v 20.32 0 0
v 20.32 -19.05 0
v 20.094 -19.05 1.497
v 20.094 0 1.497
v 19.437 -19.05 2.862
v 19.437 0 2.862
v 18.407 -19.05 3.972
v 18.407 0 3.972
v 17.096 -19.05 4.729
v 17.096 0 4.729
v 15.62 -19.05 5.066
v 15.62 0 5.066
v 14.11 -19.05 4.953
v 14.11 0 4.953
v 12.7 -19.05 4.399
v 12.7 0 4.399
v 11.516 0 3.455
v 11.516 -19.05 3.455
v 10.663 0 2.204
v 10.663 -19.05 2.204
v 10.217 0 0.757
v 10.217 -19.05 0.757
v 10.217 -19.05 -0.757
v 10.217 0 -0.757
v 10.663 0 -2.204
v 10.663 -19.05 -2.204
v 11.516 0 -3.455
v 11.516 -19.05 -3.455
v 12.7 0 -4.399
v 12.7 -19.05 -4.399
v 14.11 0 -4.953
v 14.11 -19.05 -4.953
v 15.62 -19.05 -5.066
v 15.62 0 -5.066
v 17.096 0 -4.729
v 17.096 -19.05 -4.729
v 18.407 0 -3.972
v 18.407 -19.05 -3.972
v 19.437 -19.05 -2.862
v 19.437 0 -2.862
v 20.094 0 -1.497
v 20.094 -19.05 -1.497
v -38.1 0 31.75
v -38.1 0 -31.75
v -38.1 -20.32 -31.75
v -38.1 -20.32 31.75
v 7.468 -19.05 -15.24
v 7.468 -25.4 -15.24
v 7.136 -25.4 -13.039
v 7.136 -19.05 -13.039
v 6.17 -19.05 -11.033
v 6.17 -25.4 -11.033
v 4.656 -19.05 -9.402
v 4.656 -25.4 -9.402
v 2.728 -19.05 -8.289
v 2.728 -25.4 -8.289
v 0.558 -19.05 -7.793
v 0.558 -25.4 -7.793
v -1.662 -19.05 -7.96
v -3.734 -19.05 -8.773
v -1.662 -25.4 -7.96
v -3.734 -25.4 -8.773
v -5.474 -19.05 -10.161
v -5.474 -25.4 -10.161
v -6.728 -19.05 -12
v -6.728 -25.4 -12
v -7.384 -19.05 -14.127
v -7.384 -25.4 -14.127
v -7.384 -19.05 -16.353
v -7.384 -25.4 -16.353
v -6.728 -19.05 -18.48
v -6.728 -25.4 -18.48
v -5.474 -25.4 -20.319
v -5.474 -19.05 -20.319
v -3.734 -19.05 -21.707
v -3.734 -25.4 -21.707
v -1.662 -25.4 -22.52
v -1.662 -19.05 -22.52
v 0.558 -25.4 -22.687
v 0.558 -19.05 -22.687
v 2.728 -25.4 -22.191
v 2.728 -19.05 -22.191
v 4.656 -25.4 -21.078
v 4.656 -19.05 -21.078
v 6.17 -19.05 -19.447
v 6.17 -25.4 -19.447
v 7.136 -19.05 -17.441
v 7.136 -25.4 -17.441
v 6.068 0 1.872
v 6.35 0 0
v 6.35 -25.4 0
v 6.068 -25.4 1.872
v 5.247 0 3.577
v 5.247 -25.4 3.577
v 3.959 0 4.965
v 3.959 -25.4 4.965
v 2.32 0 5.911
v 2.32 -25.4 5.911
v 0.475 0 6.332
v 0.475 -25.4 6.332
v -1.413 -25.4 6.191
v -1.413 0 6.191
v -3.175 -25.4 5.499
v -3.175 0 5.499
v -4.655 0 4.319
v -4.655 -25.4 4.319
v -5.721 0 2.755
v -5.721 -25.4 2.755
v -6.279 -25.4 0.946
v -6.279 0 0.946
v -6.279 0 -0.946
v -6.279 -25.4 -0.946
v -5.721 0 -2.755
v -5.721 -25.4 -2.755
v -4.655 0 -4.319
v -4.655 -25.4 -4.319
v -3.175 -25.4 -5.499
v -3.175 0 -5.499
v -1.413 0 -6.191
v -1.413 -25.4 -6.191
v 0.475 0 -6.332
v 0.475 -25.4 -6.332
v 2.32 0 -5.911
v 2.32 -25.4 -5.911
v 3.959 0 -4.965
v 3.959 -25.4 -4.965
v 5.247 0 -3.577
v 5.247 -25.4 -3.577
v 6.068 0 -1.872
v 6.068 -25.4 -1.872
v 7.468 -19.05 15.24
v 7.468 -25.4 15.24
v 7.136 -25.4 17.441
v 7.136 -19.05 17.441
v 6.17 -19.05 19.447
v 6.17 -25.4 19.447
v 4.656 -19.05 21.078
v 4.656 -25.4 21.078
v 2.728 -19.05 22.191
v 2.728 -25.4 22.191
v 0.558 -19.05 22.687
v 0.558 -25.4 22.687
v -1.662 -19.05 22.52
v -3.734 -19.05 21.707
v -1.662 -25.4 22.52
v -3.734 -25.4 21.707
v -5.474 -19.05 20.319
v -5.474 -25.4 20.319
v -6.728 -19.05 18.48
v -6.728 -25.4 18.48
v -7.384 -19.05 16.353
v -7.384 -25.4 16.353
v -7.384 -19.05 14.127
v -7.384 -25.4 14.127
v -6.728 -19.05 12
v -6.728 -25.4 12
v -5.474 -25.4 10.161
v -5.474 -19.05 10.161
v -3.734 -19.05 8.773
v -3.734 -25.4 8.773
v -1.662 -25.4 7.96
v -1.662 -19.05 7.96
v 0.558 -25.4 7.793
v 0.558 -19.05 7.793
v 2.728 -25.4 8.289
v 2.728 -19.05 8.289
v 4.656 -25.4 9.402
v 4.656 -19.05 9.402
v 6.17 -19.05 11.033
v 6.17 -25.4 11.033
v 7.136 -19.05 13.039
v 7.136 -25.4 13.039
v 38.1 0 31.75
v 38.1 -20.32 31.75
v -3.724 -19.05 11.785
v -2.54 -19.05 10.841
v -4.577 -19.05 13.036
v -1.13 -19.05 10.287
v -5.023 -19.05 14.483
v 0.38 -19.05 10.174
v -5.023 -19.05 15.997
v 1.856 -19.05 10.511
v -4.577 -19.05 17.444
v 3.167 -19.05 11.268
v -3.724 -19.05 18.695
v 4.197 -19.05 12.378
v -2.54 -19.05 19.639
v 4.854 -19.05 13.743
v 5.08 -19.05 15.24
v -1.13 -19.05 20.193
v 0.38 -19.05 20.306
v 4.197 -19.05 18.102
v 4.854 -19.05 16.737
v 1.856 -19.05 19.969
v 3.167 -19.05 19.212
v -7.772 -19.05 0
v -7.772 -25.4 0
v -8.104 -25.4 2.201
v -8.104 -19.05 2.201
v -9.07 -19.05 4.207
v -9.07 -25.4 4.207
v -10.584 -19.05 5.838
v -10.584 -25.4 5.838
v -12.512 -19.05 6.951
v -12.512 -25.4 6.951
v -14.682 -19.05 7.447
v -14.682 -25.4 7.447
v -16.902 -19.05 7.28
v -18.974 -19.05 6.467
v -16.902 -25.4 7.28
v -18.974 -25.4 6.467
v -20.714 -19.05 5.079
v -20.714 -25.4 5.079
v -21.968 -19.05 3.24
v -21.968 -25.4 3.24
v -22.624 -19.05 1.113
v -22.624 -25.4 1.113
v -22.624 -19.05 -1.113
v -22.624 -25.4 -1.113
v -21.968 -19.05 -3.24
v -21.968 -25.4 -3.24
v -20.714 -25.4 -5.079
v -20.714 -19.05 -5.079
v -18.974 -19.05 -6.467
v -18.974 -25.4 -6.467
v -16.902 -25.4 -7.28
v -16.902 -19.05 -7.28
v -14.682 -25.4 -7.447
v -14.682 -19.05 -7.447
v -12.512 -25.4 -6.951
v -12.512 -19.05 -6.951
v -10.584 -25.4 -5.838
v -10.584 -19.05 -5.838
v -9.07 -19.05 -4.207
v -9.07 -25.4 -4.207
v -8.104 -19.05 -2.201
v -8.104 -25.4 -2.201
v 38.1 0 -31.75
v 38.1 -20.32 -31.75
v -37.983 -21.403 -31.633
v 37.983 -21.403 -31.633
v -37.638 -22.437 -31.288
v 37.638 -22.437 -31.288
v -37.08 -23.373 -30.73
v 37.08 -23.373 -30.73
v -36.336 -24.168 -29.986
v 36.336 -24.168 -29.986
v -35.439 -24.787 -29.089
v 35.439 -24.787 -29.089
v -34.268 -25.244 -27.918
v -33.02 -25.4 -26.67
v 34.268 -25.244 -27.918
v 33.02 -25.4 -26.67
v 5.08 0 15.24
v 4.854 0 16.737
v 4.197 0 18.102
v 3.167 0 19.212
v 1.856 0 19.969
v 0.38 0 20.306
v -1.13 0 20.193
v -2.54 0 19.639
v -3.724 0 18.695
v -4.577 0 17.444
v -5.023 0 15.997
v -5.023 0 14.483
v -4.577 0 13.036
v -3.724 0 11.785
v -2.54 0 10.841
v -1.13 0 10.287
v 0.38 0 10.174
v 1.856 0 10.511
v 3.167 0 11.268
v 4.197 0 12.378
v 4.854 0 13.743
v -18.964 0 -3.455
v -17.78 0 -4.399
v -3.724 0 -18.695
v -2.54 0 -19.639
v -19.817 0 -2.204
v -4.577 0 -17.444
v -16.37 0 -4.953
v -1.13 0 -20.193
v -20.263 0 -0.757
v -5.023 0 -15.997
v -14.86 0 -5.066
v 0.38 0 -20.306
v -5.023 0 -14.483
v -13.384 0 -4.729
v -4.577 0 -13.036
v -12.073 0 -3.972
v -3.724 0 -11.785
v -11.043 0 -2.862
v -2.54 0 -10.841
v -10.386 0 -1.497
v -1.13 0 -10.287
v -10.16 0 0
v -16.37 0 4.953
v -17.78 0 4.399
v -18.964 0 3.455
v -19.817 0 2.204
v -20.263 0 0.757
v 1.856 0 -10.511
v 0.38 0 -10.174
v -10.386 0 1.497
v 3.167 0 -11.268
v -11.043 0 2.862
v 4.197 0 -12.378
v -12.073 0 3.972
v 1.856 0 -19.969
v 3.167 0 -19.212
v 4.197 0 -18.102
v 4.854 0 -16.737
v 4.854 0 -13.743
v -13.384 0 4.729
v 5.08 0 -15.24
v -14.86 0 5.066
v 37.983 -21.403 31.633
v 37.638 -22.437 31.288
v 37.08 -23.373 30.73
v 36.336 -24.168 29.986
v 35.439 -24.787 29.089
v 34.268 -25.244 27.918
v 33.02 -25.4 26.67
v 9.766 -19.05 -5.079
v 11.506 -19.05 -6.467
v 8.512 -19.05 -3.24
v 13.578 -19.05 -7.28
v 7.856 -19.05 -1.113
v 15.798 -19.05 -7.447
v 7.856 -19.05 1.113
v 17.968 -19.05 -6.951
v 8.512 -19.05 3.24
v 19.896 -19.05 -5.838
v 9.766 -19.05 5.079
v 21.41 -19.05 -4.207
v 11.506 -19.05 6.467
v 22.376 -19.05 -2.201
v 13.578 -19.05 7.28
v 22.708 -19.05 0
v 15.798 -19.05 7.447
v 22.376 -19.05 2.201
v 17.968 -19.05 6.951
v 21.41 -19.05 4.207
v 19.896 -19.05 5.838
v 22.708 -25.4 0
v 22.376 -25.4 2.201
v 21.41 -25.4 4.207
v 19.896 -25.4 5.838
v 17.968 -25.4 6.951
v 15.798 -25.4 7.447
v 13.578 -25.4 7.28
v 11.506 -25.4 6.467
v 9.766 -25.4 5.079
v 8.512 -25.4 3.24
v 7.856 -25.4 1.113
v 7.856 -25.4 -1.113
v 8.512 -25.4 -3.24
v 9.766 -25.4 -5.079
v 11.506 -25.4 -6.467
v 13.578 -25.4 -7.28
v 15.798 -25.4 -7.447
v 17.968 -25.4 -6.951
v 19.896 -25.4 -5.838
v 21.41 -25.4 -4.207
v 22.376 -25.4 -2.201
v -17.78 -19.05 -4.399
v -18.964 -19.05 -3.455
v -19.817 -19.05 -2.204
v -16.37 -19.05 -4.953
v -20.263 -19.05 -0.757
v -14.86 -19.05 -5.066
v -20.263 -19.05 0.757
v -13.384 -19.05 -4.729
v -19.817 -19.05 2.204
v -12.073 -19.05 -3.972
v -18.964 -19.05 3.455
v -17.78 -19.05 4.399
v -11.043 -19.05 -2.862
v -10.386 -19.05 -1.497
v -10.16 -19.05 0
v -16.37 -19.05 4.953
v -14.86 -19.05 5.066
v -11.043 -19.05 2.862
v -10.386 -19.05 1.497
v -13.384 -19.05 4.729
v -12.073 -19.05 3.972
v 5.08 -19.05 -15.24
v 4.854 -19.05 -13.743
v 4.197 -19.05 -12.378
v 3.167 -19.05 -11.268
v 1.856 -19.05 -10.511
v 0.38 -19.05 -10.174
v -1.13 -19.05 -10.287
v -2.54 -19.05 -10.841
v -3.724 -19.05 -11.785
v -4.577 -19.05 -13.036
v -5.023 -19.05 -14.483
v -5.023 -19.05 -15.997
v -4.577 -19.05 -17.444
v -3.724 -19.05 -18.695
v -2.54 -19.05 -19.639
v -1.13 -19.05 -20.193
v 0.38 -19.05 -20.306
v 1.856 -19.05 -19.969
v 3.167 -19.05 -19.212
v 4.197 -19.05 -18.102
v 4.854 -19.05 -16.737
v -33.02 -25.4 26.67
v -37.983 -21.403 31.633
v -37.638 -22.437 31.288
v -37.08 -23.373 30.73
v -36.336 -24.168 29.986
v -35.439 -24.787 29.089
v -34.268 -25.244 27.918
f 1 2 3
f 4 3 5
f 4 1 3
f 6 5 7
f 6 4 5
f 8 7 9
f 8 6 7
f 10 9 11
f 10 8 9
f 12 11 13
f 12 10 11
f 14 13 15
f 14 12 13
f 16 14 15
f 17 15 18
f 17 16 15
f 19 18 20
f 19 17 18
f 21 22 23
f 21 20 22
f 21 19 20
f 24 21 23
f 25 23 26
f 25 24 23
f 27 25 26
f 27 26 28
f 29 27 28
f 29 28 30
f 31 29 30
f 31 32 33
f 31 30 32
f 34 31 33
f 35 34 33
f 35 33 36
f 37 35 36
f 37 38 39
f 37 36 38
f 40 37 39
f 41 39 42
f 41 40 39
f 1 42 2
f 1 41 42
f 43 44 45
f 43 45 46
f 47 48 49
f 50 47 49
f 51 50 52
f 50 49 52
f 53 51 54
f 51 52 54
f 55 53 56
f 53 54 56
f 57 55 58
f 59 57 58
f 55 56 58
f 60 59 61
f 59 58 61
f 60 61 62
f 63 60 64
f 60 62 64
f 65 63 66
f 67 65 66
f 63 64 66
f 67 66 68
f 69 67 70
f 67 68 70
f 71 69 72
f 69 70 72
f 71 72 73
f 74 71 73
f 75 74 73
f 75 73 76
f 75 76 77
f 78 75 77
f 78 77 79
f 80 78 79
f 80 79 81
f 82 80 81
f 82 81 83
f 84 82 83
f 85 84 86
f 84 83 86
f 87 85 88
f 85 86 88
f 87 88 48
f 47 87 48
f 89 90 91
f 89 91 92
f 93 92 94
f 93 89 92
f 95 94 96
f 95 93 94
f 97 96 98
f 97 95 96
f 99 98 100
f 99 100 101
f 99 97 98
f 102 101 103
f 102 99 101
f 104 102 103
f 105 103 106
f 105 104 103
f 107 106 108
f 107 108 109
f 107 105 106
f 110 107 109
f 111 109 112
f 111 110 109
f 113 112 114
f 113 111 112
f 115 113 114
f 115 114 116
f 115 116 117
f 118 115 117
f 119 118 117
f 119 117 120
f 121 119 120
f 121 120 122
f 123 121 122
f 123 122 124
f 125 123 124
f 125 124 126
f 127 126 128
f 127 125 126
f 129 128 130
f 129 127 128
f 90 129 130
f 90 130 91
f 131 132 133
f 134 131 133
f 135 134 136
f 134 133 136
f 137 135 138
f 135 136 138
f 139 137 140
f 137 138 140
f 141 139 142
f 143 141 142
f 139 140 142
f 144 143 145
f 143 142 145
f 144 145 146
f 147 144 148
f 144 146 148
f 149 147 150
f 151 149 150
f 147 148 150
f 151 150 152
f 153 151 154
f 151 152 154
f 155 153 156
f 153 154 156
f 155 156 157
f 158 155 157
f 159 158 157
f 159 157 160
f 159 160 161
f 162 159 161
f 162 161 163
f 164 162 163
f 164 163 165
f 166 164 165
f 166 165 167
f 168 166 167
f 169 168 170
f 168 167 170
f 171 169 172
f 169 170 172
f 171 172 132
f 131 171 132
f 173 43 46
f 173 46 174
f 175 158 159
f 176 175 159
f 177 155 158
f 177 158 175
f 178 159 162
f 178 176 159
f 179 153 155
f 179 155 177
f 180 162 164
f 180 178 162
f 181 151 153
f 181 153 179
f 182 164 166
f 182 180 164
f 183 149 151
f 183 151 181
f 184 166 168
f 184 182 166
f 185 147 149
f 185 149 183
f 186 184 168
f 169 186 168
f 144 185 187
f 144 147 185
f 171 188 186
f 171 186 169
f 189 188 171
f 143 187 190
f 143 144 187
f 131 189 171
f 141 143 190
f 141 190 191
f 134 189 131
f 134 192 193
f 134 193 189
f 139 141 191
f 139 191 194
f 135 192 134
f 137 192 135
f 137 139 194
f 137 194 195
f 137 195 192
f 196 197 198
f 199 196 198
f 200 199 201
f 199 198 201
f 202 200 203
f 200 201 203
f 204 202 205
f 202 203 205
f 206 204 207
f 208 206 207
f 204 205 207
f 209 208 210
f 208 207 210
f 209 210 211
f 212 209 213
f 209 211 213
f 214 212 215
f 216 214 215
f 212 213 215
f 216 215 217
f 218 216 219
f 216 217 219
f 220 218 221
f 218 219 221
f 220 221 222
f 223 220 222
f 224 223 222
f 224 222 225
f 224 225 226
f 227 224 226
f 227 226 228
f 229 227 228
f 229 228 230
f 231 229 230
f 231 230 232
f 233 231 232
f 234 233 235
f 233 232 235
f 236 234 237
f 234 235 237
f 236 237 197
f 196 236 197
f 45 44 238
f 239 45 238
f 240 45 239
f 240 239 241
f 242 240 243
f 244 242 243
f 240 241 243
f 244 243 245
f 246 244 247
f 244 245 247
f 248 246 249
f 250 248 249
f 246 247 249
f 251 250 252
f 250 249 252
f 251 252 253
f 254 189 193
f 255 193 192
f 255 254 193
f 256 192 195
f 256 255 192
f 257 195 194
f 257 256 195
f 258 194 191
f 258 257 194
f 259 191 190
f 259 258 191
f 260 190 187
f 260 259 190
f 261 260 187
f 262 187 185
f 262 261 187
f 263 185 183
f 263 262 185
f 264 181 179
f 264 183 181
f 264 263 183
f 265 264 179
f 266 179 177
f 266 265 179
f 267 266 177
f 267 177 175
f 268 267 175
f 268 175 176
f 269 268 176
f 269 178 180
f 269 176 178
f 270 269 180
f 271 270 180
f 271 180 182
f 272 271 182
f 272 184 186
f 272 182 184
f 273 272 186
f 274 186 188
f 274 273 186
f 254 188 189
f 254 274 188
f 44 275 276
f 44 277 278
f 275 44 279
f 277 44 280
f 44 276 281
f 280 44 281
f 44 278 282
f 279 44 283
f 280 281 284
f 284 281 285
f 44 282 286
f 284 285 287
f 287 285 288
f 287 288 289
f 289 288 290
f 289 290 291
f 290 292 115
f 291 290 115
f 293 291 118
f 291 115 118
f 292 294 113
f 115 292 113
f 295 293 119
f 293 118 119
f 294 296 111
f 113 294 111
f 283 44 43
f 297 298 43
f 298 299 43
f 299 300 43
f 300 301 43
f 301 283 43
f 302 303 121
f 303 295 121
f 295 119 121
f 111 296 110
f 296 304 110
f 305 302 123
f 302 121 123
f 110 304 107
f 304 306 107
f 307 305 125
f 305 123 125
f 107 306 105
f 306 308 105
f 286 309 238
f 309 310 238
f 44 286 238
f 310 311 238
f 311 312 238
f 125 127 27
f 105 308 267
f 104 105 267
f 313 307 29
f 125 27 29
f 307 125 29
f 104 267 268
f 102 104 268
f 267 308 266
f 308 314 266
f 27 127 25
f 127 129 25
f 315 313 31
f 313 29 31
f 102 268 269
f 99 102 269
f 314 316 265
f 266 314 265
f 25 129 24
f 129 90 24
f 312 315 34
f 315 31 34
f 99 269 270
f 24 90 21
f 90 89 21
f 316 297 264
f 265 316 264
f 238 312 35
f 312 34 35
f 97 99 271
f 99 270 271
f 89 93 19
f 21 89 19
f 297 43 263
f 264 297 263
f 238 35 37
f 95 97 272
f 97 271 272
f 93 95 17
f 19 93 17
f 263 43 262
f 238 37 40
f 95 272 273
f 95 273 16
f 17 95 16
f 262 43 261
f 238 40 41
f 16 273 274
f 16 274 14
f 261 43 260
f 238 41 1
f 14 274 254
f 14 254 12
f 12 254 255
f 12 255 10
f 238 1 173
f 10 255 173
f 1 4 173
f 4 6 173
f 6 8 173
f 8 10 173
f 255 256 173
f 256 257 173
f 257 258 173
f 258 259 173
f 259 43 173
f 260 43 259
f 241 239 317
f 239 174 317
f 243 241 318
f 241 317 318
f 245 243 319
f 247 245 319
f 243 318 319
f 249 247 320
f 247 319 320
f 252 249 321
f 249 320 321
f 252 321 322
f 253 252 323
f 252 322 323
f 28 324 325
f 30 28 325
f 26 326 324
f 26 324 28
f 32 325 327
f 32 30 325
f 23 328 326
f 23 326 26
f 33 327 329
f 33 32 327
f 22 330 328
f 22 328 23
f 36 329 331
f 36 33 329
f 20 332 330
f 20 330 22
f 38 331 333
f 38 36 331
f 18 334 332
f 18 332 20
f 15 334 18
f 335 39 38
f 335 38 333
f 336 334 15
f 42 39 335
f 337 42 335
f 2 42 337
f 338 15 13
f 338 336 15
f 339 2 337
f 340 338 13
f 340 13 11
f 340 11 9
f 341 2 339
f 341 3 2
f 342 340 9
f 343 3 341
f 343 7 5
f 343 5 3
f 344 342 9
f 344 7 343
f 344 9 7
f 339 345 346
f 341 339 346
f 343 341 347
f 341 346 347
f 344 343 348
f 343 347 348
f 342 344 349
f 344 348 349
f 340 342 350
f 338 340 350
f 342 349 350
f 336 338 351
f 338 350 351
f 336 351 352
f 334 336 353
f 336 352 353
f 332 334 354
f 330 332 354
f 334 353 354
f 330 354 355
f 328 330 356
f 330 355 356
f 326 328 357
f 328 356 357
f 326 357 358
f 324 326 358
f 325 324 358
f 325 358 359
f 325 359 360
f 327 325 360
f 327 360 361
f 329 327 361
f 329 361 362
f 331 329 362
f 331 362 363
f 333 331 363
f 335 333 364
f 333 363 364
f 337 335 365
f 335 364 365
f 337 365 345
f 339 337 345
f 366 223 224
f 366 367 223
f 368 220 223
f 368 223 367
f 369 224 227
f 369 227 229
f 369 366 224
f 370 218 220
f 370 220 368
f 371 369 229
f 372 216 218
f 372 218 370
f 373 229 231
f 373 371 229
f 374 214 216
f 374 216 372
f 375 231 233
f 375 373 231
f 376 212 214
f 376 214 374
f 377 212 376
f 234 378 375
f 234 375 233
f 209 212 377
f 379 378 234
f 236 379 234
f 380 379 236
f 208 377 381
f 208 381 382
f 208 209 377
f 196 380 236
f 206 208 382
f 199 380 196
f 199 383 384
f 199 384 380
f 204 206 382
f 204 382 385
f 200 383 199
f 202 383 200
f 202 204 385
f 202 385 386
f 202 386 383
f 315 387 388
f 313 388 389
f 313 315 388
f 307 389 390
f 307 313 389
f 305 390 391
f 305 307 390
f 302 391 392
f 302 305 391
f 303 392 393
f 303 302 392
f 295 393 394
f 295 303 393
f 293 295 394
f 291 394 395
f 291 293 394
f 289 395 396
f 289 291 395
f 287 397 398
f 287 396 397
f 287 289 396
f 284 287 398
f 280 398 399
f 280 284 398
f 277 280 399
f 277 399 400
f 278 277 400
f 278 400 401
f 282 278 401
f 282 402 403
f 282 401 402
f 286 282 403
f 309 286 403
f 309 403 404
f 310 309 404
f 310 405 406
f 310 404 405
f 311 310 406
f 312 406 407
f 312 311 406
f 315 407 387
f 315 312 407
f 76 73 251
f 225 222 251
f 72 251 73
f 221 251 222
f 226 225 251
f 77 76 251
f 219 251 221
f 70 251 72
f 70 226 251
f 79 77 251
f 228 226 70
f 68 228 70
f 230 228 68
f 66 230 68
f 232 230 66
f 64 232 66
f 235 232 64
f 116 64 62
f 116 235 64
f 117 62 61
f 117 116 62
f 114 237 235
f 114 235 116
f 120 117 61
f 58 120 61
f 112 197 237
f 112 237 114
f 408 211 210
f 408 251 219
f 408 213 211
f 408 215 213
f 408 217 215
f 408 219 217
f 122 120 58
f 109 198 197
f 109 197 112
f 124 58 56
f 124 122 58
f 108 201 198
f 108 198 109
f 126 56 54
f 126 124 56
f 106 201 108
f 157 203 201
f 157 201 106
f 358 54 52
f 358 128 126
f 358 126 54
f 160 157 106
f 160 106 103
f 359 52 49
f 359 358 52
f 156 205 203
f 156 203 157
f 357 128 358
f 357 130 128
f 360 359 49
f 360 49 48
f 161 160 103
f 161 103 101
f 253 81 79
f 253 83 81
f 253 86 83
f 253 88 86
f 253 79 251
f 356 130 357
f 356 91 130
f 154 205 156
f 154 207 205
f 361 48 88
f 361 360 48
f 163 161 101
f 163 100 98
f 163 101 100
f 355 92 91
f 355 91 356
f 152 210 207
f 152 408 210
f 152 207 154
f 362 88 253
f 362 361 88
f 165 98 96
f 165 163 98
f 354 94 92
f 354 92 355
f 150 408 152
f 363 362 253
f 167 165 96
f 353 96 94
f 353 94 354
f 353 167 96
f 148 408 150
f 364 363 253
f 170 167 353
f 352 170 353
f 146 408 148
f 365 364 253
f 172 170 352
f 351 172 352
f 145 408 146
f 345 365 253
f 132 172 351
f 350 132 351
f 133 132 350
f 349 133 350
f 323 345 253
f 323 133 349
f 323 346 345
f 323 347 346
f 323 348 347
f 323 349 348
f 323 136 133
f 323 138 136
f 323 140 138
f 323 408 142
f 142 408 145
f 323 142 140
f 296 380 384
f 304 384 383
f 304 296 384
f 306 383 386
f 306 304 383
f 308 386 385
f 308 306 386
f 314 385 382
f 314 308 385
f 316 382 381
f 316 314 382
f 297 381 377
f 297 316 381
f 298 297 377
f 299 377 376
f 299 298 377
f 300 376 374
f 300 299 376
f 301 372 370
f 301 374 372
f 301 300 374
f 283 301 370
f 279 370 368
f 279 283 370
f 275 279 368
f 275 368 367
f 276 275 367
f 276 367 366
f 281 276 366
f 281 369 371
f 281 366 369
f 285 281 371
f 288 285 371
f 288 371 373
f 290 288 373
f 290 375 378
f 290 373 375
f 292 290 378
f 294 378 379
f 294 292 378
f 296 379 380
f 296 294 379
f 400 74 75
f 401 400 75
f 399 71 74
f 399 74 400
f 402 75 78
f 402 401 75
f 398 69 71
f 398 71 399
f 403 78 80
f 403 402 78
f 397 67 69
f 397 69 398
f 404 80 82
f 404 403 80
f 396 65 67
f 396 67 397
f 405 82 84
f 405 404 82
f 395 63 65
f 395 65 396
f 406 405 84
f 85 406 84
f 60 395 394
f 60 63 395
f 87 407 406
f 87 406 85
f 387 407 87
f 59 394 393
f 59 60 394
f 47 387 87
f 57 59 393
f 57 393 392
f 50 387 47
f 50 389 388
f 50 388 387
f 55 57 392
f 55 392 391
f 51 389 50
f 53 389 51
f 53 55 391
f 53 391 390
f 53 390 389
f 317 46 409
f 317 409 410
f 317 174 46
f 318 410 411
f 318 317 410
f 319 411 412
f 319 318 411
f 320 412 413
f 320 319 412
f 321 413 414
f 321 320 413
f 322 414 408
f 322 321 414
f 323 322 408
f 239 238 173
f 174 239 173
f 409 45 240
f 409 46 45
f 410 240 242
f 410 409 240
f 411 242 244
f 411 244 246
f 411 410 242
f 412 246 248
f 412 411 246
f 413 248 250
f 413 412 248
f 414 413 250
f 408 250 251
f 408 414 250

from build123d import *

# Parameters (mm, degrees)
F0_W     = 76.2
F0_H     = 63.5
F0_R     = 5.08
F0_R_2   = 6.35
F1_DEPTH = 25.4
F2_R     = 5.08
F3_R     = 7.4676
F3_R_2   = 5.08
F4_DEPTH = 6.35


with BuildPart() as f1:
    # F0 (on Front) → F1 (new body)
    with BuildSketch(Plane.XZ):
        Rectangle(F0_W, F0_H)
        with Locations((0, -15.24)):
            Circle(F0_R, mode=Mode.SUBTRACT)
        with Locations((-15.24, 0)):
            Circle(F0_R, mode=Mode.SUBTRACT)
        Circle(F0_R_2, mode=Mode.SUBTRACT)
        with Locations((15.24, 0)):
            Circle(F0_R, mode=Mode.SUBTRACT)
        with Locations((0, 15.24)):
            Circle(F0_R, mode=Mode.SUBTRACT)
    extrude(amount=F1_DEPTH)

    # F2
    f2_edges = [f1.edges().sort_by_distance(p)[0] for p in [
        (0, -25.4, 31.75),
        (-38.1, -25.4, 0),
        (0, -25.4, -31.75),
        (38.1, -25.4, 0),
    ]]
    fillet(f2_edges, radius=F2_R)

    # F3 (on face) → F4 (cut)
    with BuildSketch(Plane.XZ.offset(25.4)):
        with Locations((-15.24, 0)):
            Circle(F3_R)
        with Locations((0, 15.24)):
            Circle(F3_R)
        with Locations((15.24, 0)):
            Circle(F3_R)
        with Locations((0, -15.24)):
            Circle(F3_R)
        with Locations((0, -15.24)):
            Circle(F3_R_2)
        with Locations((-15.24, 0)):
            Circle(F3_R_2)
        with Locations((0, 15.24)):
            Circle(F3_R_2)
        with Locations((15.24, 0)):
            Circle(F3_R_2)
    extrude(amount=-F4_DEPTH, mode=Mode.SUBTRACT)


solid = f1.part
